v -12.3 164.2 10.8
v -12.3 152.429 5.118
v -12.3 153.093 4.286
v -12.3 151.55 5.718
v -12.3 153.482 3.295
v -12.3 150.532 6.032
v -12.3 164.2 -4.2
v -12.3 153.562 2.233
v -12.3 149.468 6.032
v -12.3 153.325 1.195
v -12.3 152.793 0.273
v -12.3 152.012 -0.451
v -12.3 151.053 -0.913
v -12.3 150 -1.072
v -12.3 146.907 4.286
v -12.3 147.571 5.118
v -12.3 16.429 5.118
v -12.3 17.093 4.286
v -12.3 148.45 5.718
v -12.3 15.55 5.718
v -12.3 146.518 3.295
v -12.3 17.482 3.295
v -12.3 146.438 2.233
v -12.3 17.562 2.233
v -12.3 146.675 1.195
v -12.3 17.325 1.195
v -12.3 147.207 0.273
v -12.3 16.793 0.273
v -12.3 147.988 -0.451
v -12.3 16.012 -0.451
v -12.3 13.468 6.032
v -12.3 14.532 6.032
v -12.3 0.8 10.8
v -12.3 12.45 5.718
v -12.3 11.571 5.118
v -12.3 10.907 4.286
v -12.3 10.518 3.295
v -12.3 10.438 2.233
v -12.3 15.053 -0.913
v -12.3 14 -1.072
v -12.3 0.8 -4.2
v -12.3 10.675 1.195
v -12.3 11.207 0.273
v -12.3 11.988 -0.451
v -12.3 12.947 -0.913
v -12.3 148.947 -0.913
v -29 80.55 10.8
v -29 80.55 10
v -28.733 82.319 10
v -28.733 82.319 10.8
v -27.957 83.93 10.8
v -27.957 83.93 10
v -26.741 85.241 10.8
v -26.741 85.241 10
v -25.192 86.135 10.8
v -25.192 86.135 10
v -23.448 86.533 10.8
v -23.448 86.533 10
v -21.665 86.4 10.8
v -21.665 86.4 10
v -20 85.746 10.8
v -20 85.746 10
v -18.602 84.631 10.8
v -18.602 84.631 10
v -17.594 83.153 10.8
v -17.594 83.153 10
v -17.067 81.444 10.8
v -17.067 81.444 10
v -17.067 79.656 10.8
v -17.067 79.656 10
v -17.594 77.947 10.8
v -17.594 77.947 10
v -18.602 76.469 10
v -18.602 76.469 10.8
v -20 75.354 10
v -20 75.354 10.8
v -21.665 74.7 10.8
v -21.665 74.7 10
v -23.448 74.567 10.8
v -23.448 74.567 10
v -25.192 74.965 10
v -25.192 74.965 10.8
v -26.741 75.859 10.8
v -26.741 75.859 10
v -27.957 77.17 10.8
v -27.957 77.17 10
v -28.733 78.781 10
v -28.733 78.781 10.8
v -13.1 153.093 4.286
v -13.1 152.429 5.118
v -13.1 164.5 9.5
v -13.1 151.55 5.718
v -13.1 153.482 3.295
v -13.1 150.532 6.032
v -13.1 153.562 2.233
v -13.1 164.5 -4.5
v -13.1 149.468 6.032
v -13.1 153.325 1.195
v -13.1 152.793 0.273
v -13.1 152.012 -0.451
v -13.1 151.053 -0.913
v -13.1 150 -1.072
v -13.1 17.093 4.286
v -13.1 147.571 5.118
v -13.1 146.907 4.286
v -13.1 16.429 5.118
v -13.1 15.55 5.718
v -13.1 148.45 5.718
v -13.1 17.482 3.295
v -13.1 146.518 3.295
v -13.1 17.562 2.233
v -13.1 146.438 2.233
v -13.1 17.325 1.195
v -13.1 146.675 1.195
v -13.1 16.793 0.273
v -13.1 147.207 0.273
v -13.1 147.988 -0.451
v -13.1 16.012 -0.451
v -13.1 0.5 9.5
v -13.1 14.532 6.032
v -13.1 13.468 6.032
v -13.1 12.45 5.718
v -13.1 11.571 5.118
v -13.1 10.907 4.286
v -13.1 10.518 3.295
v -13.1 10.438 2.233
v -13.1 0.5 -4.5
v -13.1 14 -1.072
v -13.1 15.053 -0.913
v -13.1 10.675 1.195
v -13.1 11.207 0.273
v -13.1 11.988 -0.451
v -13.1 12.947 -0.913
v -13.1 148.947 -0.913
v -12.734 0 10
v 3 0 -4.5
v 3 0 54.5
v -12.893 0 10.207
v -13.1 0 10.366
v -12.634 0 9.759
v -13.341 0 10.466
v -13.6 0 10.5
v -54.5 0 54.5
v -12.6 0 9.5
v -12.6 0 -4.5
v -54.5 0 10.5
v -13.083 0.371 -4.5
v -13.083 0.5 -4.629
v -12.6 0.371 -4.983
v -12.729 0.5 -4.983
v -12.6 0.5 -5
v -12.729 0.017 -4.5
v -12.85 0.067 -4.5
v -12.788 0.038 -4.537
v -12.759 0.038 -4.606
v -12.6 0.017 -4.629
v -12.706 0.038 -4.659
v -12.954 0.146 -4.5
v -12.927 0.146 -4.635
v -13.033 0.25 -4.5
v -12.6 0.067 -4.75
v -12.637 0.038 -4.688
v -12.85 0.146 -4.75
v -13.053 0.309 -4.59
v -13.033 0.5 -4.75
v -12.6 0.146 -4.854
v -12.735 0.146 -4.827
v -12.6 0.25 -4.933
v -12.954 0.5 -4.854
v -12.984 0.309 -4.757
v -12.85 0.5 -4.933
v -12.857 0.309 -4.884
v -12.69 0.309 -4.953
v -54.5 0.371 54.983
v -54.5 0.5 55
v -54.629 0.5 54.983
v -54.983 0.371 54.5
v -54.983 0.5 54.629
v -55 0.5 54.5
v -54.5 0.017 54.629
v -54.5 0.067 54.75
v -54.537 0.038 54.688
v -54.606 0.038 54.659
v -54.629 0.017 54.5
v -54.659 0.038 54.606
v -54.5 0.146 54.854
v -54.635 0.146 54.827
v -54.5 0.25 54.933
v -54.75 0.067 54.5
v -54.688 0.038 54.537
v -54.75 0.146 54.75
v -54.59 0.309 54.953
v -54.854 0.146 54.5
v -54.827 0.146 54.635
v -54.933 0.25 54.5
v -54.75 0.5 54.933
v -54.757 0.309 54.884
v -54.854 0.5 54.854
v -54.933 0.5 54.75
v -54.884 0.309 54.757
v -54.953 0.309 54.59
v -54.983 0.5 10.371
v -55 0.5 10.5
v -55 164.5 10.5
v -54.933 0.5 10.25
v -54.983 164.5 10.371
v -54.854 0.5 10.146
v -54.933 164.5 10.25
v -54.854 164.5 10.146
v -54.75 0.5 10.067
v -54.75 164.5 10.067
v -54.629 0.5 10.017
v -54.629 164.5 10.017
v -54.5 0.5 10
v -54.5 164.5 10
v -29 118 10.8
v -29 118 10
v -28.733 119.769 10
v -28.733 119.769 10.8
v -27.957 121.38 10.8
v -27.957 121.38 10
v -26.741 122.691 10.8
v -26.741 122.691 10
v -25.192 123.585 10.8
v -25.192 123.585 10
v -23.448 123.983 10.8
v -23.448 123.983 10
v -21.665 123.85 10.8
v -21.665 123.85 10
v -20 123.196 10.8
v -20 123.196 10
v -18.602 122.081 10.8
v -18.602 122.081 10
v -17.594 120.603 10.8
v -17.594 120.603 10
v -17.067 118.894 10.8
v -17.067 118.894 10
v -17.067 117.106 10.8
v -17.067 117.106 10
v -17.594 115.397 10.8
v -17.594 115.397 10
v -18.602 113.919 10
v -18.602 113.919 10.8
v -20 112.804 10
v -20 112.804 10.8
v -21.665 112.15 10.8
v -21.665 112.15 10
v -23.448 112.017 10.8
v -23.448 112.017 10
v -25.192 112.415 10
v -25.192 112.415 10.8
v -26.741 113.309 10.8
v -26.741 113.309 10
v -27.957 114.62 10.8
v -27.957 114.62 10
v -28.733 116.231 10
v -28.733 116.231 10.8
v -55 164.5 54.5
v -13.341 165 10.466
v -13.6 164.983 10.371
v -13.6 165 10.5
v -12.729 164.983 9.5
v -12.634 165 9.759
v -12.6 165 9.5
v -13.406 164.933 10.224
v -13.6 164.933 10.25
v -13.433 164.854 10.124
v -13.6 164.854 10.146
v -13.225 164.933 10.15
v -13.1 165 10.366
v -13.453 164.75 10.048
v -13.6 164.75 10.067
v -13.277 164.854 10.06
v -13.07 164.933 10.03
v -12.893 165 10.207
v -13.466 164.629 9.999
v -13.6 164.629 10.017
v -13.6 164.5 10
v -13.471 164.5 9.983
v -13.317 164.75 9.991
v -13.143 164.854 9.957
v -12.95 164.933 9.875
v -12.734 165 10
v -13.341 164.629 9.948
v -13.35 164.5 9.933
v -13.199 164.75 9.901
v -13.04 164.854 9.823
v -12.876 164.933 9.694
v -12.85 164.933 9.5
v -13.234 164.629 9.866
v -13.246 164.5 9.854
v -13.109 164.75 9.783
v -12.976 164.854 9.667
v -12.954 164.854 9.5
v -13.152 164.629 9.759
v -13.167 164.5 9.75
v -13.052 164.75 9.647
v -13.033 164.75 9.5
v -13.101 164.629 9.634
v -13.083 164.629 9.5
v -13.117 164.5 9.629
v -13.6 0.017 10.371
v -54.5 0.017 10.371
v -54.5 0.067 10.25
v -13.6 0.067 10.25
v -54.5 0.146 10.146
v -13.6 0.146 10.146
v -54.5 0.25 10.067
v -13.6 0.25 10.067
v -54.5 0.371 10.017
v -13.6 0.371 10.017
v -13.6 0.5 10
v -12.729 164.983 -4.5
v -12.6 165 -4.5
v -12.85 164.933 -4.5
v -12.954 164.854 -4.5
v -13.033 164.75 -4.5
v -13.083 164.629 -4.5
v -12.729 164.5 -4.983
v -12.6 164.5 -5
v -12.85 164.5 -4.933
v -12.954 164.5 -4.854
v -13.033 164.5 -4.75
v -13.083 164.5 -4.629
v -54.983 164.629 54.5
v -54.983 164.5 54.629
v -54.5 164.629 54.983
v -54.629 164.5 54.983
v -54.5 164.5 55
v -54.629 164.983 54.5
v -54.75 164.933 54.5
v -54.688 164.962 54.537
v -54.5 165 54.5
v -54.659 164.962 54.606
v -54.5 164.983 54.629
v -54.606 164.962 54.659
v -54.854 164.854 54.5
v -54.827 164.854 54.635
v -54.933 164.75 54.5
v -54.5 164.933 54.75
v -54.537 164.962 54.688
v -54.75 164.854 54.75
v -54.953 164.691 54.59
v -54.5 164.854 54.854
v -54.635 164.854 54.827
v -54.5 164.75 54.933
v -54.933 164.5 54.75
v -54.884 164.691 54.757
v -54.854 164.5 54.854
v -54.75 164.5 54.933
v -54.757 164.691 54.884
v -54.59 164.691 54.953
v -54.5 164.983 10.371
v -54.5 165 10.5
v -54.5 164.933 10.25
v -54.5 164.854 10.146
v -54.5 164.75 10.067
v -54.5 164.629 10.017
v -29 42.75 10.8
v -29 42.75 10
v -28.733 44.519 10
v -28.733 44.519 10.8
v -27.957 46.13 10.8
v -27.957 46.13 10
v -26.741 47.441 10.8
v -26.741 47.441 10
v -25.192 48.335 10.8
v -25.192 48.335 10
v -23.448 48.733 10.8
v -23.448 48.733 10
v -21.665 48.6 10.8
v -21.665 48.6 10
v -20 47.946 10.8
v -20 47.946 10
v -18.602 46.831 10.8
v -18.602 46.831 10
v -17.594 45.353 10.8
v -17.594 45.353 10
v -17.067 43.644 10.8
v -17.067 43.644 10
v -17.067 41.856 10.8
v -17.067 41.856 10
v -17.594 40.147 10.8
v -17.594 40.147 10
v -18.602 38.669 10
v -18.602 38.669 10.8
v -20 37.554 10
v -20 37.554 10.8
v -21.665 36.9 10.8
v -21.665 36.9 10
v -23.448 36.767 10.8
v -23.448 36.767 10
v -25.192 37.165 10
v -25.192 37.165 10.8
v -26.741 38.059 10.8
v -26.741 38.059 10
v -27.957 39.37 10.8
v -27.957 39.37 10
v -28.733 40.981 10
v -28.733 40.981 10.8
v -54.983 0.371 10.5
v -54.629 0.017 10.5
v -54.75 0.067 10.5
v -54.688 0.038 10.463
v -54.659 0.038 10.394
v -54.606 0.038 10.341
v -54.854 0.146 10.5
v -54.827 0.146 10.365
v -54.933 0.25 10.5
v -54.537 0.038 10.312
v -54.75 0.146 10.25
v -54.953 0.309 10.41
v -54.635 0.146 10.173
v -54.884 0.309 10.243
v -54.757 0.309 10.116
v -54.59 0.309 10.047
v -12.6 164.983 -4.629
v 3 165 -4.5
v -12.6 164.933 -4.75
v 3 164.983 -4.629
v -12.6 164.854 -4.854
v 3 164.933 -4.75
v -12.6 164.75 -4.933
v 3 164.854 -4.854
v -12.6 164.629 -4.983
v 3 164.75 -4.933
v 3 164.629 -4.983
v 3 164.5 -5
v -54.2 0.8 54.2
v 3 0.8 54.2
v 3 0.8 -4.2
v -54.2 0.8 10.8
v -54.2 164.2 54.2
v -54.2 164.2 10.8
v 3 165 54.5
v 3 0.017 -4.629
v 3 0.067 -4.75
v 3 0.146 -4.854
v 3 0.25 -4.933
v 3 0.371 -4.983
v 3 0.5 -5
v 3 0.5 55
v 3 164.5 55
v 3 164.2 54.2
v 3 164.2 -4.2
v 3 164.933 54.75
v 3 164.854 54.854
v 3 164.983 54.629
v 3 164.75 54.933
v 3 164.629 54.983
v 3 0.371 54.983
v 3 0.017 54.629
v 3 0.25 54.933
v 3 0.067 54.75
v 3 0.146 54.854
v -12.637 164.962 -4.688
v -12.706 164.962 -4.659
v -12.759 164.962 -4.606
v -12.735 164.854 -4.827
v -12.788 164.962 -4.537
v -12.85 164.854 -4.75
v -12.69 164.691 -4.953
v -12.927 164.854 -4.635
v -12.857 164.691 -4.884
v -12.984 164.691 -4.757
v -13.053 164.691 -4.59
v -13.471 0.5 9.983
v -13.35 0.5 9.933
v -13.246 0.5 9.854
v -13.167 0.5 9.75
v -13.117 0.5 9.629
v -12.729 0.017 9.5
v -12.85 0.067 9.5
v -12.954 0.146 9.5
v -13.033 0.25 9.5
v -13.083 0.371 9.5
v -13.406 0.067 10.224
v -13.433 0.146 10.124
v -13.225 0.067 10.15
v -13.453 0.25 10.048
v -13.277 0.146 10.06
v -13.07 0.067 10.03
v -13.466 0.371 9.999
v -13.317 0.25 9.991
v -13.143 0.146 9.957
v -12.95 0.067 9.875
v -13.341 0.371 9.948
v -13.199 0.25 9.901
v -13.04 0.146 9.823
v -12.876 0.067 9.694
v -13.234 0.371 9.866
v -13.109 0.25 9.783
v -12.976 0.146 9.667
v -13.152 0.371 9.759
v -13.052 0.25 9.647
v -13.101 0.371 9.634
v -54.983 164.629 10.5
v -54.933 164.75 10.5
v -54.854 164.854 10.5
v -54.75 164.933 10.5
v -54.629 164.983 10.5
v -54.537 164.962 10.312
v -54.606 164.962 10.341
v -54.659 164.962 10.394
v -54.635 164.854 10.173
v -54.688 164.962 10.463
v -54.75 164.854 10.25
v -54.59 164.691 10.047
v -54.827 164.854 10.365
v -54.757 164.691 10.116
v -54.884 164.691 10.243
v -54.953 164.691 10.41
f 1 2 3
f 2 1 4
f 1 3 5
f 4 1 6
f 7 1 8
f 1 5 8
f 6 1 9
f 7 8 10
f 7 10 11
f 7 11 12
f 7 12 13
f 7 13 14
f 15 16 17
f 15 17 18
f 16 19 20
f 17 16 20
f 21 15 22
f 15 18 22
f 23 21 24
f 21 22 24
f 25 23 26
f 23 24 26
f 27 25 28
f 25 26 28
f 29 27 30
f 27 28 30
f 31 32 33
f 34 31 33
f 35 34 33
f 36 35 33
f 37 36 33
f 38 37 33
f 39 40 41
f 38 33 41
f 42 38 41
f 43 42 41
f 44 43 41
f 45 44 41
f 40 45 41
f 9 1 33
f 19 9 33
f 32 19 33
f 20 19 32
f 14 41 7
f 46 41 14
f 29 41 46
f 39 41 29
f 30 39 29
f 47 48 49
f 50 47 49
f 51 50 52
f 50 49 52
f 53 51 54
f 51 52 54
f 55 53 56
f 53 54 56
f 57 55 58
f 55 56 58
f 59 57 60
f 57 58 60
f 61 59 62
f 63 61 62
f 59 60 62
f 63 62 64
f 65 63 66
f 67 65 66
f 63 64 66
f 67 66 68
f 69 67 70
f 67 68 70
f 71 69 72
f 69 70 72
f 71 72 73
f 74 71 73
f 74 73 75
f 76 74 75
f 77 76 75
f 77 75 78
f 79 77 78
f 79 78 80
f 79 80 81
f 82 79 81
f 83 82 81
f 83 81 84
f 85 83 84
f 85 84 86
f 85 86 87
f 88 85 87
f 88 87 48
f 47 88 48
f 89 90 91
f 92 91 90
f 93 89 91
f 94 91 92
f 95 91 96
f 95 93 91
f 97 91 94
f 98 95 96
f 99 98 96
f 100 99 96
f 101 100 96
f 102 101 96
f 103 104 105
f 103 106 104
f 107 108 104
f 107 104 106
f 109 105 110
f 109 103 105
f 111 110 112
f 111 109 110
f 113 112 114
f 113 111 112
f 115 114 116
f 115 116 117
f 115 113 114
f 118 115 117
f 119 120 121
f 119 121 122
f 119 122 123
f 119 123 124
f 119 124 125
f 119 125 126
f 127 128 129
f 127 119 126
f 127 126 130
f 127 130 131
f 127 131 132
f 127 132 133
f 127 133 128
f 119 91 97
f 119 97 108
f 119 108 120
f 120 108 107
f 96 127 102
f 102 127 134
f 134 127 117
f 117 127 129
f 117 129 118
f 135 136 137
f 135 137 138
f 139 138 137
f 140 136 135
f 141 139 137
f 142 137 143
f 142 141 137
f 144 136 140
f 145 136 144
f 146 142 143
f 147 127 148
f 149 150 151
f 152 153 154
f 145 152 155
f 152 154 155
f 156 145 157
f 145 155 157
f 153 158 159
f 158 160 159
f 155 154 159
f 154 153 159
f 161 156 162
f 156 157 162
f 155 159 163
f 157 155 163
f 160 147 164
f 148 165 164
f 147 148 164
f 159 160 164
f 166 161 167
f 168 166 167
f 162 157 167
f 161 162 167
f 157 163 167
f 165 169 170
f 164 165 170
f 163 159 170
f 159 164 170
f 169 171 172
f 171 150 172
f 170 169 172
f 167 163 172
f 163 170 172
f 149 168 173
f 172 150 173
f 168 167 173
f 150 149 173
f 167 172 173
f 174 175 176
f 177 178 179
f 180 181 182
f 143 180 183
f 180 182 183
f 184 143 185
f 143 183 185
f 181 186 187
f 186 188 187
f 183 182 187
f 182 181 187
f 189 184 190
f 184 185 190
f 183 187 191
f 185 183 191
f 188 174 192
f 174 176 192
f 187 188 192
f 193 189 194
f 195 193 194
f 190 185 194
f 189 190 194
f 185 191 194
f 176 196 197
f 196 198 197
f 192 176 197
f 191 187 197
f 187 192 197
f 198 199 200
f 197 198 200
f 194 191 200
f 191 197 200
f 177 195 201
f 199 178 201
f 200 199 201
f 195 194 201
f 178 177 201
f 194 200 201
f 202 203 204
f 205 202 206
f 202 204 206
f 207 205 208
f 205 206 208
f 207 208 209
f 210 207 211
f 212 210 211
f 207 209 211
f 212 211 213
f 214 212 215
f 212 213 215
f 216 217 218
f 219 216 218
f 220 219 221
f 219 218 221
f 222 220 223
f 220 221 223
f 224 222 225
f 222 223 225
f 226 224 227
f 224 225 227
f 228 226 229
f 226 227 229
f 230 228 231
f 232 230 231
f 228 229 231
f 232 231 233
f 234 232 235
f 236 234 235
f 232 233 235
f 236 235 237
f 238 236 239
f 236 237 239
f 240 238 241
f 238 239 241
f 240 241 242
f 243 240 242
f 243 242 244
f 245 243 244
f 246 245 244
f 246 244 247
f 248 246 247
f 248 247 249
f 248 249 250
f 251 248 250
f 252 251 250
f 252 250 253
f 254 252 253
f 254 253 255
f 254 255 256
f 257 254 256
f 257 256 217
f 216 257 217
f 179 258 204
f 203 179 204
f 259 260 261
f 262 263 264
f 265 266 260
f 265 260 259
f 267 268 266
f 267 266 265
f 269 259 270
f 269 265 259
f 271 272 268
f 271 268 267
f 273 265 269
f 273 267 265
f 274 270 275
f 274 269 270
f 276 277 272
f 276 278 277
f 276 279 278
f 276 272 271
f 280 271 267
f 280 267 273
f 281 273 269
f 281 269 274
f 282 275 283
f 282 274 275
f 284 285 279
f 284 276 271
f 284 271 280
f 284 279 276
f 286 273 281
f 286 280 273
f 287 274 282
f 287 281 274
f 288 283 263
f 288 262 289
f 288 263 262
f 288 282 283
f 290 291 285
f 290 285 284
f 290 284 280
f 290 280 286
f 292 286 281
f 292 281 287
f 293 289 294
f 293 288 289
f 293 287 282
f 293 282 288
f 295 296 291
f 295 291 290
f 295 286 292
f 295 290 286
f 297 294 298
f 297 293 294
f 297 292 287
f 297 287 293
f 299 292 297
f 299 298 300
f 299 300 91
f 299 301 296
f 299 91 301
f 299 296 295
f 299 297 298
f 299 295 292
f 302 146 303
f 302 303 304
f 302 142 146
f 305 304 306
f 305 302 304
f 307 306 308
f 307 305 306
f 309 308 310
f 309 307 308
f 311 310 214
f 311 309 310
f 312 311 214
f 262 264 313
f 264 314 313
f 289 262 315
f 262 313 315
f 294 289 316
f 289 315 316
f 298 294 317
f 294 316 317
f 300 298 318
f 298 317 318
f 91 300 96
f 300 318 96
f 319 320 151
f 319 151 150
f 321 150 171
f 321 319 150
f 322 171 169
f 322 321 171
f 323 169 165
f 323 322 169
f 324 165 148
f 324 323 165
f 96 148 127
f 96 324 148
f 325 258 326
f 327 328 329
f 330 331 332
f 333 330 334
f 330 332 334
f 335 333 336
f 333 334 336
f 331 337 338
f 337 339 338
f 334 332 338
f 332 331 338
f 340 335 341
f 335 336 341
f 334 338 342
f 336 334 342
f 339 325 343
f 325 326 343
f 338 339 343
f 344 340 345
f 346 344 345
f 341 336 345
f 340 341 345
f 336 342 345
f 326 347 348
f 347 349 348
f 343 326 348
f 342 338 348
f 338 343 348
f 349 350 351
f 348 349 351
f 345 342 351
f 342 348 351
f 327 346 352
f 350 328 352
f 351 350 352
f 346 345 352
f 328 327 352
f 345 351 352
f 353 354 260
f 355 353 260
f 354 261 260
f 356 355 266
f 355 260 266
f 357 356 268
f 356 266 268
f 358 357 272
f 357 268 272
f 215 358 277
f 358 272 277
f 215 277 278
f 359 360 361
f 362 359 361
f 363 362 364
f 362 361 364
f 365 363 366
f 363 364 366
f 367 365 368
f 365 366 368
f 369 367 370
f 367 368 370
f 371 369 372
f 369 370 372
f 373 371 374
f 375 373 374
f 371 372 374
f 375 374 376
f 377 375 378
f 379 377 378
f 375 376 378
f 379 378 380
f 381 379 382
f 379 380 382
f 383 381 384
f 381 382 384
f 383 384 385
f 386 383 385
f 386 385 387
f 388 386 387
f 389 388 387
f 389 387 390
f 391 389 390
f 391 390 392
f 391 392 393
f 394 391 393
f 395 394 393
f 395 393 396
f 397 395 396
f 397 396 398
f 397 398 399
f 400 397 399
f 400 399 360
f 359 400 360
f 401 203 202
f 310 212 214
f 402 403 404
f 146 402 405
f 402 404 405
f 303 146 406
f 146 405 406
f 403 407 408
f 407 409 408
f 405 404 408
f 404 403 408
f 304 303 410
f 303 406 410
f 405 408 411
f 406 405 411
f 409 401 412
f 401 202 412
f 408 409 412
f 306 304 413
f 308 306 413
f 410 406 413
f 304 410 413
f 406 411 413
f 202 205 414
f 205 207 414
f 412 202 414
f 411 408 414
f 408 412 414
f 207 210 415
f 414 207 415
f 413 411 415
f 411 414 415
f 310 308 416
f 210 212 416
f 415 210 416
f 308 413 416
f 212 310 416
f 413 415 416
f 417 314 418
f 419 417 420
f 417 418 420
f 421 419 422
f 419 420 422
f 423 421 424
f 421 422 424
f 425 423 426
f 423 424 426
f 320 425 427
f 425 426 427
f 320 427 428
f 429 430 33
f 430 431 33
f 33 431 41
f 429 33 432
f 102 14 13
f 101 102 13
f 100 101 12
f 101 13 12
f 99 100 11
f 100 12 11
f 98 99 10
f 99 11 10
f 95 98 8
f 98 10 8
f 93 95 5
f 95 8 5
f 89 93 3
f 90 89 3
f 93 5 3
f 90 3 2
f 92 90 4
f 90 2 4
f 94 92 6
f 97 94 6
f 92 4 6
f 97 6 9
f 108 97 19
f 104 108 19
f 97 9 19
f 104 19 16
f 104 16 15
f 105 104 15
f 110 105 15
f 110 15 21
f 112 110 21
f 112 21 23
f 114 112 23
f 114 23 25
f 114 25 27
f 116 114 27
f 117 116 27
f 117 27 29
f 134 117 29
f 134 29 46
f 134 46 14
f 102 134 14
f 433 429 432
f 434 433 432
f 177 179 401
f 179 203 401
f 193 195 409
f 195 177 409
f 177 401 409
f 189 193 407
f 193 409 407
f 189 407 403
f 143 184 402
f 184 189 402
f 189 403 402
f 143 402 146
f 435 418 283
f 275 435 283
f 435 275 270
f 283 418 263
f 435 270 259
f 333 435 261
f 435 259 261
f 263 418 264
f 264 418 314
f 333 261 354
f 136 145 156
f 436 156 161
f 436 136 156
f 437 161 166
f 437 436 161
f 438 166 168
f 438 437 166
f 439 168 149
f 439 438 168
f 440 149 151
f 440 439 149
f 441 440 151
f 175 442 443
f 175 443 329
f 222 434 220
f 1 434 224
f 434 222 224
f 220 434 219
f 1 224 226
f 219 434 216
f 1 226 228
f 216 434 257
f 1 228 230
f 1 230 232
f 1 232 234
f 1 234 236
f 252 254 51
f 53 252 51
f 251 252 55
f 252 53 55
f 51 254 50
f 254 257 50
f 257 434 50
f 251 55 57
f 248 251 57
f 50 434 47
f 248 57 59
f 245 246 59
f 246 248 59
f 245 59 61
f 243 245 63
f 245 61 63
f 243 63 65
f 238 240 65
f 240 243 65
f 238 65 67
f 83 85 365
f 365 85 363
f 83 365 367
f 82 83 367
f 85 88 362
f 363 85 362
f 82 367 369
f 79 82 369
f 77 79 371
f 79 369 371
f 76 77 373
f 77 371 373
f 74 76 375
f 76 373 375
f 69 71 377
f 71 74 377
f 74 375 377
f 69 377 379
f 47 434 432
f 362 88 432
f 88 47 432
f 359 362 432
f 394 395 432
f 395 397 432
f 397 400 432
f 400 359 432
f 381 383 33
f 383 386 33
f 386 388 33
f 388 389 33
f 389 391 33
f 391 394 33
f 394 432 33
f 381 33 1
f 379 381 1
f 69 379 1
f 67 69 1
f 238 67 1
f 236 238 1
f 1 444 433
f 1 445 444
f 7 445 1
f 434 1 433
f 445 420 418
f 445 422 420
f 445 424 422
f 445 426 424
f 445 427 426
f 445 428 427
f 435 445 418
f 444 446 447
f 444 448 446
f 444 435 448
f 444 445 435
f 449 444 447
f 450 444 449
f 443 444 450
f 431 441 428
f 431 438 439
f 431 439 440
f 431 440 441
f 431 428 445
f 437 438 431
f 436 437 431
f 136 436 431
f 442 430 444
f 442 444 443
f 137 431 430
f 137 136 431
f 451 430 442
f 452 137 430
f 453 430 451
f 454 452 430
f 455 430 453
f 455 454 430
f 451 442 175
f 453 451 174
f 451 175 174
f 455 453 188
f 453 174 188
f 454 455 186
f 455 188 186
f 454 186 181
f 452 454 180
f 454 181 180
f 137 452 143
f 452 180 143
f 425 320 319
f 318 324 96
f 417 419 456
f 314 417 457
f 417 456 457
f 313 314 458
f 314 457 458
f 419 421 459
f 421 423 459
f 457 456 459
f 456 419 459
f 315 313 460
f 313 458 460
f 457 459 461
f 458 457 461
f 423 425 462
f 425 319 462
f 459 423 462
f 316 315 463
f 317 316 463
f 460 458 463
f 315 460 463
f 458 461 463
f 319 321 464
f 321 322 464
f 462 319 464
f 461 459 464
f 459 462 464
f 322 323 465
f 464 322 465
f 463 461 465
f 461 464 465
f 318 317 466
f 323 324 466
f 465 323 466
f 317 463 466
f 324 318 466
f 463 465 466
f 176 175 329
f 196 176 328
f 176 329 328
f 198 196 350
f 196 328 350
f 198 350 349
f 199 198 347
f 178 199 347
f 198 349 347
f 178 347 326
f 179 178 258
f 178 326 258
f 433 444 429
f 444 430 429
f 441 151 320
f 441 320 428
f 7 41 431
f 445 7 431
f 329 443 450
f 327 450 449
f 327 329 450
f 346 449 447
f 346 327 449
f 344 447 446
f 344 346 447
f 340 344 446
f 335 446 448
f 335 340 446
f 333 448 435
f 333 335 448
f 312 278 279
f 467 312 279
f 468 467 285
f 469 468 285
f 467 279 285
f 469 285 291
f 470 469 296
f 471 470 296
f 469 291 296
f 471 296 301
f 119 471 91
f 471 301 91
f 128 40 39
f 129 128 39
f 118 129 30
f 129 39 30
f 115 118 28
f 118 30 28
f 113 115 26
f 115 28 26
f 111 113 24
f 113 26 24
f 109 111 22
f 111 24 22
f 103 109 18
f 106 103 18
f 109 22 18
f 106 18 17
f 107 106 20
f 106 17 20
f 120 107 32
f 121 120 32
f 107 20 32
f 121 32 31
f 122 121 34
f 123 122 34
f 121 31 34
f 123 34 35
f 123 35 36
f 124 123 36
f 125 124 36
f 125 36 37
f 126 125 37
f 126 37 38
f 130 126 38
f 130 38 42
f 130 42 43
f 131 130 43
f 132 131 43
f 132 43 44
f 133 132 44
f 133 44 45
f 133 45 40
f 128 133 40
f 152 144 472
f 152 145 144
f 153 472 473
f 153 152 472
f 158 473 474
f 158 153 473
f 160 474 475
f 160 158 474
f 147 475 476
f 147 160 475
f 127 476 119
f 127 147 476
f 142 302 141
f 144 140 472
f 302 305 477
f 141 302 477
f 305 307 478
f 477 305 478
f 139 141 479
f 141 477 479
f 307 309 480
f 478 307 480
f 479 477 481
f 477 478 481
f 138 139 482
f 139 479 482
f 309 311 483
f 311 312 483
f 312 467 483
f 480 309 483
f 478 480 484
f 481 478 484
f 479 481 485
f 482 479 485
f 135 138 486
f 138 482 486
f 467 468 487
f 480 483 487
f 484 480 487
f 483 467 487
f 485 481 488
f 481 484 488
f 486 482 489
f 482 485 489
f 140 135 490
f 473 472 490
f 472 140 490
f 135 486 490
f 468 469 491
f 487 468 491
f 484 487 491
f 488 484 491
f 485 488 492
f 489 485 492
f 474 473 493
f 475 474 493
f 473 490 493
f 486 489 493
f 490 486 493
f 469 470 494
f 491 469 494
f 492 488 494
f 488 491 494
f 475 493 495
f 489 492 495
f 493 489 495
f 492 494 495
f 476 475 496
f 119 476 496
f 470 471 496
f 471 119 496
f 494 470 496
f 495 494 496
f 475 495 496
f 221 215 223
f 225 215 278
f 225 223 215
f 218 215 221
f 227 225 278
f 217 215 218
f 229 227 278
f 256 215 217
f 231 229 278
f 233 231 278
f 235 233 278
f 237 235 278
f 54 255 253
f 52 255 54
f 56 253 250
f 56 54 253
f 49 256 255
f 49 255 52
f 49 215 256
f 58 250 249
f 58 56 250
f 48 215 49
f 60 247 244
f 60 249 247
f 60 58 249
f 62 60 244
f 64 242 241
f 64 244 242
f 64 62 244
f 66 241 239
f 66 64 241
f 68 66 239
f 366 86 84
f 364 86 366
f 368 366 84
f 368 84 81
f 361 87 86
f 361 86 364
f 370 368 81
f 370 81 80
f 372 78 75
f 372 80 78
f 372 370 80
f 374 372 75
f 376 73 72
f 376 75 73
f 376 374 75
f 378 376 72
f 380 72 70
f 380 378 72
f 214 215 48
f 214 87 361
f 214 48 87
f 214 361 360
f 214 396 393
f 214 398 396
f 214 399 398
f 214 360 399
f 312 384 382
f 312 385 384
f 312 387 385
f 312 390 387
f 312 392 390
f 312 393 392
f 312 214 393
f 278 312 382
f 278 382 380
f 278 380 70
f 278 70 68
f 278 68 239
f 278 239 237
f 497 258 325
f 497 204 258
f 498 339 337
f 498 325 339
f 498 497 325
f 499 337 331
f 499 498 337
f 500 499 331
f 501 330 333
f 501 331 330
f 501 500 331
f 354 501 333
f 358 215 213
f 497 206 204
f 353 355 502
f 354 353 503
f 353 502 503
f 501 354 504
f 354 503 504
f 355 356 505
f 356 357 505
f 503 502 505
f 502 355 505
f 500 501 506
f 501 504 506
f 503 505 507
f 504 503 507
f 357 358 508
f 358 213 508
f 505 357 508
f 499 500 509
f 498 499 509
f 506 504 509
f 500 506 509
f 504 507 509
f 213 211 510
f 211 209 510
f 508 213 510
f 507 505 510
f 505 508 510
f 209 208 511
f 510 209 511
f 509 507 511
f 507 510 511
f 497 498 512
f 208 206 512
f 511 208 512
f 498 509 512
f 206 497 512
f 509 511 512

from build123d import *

# Parameters (mm, degrees)
EXTRUDE_1_DEPTH              = 165
SHELL_1_T                    = -0.8
SKETCH_2_R                   = 6
CUT_EXTRUDE_4_DEPTH          = 1
FILLET_1_R                   = 0.5
HOLE_WIZARD_9_32_0_28125_1_D = 7.14375


with BuildPart() as part:
    # 草图1 → 凸台-拉伸1 (new body)
    with BuildSketch(Plane(origin=(0, 0, 0), x_dir=(1, 0, 0), z_dir=(0, 1, 0))):
        Polygon((3, 5), (3, -55), (-55, -55), (-55, -10), (-13.1, -10), (-13.1, 5), align=None)
    extrude(amount=EXTRUDE_1_DEPTH)

    # 抽壳1
    shell_1_openings = [part.faces().sort_by_distance(p)[0] for p in [
        (3, 82.5, 25),
    ]]
    offset(amount=SHELL_1_T, openings=shell_1_openings, kind=Kind.INTERSECTION)

    # 草图2 → 切除-拉伸4 (cut)
    with BuildSketch(Plane(origin=(0, 0, 10), x_dir=(-1, 0, 0), z_dir=(0, 0, -1))):
        with Locations((23, 42.75)):
            Circle(SKETCH_2_R)
        with Locations((23, 118)):
            Circle(SKETCH_2_R)
        with Locations((23, 80.55)):
            Circle(SKETCH_2_R)
    extrude(amount=-CUT_EXTRUDE_4_DEPTH, mode=Mode.SUBTRACT)

    # 圆角1
    fillet_1_edges = [part.edges().sort_by_distance(p)[0] for p in [
        (-55, 82.5, 55),
        (-55, 82.5, 10),
        (-13.1, 82.5, 10),
        (-13.1, 82.5, -5),
        (-34.05, 165, 10),
        (-55, 165, 32.5),
        (-26, 165, 55),
        (-5.05, 165, -5),
        (-26, 0, 55),
        (-55, 0, 32.5),
        (-34.05, 0, 10),
        (-13.1, 0, 2.5),
        (-5.05, 0, -5),
        (-13.1, 165, 2.5),
    ]]
    fillet(fillet_1_edges, radius=FILLET_1_R)

    # 9/32 (0.28125) 直径孔1 (through all)
    with Locations(Plane.ZY.offset(13.1)):
        with Locations((2.5, 150), (2.5, 14)):
            Hole(HOLE_WIZARD_9_32_0_28125_1_D / 2)


solid = part.part
